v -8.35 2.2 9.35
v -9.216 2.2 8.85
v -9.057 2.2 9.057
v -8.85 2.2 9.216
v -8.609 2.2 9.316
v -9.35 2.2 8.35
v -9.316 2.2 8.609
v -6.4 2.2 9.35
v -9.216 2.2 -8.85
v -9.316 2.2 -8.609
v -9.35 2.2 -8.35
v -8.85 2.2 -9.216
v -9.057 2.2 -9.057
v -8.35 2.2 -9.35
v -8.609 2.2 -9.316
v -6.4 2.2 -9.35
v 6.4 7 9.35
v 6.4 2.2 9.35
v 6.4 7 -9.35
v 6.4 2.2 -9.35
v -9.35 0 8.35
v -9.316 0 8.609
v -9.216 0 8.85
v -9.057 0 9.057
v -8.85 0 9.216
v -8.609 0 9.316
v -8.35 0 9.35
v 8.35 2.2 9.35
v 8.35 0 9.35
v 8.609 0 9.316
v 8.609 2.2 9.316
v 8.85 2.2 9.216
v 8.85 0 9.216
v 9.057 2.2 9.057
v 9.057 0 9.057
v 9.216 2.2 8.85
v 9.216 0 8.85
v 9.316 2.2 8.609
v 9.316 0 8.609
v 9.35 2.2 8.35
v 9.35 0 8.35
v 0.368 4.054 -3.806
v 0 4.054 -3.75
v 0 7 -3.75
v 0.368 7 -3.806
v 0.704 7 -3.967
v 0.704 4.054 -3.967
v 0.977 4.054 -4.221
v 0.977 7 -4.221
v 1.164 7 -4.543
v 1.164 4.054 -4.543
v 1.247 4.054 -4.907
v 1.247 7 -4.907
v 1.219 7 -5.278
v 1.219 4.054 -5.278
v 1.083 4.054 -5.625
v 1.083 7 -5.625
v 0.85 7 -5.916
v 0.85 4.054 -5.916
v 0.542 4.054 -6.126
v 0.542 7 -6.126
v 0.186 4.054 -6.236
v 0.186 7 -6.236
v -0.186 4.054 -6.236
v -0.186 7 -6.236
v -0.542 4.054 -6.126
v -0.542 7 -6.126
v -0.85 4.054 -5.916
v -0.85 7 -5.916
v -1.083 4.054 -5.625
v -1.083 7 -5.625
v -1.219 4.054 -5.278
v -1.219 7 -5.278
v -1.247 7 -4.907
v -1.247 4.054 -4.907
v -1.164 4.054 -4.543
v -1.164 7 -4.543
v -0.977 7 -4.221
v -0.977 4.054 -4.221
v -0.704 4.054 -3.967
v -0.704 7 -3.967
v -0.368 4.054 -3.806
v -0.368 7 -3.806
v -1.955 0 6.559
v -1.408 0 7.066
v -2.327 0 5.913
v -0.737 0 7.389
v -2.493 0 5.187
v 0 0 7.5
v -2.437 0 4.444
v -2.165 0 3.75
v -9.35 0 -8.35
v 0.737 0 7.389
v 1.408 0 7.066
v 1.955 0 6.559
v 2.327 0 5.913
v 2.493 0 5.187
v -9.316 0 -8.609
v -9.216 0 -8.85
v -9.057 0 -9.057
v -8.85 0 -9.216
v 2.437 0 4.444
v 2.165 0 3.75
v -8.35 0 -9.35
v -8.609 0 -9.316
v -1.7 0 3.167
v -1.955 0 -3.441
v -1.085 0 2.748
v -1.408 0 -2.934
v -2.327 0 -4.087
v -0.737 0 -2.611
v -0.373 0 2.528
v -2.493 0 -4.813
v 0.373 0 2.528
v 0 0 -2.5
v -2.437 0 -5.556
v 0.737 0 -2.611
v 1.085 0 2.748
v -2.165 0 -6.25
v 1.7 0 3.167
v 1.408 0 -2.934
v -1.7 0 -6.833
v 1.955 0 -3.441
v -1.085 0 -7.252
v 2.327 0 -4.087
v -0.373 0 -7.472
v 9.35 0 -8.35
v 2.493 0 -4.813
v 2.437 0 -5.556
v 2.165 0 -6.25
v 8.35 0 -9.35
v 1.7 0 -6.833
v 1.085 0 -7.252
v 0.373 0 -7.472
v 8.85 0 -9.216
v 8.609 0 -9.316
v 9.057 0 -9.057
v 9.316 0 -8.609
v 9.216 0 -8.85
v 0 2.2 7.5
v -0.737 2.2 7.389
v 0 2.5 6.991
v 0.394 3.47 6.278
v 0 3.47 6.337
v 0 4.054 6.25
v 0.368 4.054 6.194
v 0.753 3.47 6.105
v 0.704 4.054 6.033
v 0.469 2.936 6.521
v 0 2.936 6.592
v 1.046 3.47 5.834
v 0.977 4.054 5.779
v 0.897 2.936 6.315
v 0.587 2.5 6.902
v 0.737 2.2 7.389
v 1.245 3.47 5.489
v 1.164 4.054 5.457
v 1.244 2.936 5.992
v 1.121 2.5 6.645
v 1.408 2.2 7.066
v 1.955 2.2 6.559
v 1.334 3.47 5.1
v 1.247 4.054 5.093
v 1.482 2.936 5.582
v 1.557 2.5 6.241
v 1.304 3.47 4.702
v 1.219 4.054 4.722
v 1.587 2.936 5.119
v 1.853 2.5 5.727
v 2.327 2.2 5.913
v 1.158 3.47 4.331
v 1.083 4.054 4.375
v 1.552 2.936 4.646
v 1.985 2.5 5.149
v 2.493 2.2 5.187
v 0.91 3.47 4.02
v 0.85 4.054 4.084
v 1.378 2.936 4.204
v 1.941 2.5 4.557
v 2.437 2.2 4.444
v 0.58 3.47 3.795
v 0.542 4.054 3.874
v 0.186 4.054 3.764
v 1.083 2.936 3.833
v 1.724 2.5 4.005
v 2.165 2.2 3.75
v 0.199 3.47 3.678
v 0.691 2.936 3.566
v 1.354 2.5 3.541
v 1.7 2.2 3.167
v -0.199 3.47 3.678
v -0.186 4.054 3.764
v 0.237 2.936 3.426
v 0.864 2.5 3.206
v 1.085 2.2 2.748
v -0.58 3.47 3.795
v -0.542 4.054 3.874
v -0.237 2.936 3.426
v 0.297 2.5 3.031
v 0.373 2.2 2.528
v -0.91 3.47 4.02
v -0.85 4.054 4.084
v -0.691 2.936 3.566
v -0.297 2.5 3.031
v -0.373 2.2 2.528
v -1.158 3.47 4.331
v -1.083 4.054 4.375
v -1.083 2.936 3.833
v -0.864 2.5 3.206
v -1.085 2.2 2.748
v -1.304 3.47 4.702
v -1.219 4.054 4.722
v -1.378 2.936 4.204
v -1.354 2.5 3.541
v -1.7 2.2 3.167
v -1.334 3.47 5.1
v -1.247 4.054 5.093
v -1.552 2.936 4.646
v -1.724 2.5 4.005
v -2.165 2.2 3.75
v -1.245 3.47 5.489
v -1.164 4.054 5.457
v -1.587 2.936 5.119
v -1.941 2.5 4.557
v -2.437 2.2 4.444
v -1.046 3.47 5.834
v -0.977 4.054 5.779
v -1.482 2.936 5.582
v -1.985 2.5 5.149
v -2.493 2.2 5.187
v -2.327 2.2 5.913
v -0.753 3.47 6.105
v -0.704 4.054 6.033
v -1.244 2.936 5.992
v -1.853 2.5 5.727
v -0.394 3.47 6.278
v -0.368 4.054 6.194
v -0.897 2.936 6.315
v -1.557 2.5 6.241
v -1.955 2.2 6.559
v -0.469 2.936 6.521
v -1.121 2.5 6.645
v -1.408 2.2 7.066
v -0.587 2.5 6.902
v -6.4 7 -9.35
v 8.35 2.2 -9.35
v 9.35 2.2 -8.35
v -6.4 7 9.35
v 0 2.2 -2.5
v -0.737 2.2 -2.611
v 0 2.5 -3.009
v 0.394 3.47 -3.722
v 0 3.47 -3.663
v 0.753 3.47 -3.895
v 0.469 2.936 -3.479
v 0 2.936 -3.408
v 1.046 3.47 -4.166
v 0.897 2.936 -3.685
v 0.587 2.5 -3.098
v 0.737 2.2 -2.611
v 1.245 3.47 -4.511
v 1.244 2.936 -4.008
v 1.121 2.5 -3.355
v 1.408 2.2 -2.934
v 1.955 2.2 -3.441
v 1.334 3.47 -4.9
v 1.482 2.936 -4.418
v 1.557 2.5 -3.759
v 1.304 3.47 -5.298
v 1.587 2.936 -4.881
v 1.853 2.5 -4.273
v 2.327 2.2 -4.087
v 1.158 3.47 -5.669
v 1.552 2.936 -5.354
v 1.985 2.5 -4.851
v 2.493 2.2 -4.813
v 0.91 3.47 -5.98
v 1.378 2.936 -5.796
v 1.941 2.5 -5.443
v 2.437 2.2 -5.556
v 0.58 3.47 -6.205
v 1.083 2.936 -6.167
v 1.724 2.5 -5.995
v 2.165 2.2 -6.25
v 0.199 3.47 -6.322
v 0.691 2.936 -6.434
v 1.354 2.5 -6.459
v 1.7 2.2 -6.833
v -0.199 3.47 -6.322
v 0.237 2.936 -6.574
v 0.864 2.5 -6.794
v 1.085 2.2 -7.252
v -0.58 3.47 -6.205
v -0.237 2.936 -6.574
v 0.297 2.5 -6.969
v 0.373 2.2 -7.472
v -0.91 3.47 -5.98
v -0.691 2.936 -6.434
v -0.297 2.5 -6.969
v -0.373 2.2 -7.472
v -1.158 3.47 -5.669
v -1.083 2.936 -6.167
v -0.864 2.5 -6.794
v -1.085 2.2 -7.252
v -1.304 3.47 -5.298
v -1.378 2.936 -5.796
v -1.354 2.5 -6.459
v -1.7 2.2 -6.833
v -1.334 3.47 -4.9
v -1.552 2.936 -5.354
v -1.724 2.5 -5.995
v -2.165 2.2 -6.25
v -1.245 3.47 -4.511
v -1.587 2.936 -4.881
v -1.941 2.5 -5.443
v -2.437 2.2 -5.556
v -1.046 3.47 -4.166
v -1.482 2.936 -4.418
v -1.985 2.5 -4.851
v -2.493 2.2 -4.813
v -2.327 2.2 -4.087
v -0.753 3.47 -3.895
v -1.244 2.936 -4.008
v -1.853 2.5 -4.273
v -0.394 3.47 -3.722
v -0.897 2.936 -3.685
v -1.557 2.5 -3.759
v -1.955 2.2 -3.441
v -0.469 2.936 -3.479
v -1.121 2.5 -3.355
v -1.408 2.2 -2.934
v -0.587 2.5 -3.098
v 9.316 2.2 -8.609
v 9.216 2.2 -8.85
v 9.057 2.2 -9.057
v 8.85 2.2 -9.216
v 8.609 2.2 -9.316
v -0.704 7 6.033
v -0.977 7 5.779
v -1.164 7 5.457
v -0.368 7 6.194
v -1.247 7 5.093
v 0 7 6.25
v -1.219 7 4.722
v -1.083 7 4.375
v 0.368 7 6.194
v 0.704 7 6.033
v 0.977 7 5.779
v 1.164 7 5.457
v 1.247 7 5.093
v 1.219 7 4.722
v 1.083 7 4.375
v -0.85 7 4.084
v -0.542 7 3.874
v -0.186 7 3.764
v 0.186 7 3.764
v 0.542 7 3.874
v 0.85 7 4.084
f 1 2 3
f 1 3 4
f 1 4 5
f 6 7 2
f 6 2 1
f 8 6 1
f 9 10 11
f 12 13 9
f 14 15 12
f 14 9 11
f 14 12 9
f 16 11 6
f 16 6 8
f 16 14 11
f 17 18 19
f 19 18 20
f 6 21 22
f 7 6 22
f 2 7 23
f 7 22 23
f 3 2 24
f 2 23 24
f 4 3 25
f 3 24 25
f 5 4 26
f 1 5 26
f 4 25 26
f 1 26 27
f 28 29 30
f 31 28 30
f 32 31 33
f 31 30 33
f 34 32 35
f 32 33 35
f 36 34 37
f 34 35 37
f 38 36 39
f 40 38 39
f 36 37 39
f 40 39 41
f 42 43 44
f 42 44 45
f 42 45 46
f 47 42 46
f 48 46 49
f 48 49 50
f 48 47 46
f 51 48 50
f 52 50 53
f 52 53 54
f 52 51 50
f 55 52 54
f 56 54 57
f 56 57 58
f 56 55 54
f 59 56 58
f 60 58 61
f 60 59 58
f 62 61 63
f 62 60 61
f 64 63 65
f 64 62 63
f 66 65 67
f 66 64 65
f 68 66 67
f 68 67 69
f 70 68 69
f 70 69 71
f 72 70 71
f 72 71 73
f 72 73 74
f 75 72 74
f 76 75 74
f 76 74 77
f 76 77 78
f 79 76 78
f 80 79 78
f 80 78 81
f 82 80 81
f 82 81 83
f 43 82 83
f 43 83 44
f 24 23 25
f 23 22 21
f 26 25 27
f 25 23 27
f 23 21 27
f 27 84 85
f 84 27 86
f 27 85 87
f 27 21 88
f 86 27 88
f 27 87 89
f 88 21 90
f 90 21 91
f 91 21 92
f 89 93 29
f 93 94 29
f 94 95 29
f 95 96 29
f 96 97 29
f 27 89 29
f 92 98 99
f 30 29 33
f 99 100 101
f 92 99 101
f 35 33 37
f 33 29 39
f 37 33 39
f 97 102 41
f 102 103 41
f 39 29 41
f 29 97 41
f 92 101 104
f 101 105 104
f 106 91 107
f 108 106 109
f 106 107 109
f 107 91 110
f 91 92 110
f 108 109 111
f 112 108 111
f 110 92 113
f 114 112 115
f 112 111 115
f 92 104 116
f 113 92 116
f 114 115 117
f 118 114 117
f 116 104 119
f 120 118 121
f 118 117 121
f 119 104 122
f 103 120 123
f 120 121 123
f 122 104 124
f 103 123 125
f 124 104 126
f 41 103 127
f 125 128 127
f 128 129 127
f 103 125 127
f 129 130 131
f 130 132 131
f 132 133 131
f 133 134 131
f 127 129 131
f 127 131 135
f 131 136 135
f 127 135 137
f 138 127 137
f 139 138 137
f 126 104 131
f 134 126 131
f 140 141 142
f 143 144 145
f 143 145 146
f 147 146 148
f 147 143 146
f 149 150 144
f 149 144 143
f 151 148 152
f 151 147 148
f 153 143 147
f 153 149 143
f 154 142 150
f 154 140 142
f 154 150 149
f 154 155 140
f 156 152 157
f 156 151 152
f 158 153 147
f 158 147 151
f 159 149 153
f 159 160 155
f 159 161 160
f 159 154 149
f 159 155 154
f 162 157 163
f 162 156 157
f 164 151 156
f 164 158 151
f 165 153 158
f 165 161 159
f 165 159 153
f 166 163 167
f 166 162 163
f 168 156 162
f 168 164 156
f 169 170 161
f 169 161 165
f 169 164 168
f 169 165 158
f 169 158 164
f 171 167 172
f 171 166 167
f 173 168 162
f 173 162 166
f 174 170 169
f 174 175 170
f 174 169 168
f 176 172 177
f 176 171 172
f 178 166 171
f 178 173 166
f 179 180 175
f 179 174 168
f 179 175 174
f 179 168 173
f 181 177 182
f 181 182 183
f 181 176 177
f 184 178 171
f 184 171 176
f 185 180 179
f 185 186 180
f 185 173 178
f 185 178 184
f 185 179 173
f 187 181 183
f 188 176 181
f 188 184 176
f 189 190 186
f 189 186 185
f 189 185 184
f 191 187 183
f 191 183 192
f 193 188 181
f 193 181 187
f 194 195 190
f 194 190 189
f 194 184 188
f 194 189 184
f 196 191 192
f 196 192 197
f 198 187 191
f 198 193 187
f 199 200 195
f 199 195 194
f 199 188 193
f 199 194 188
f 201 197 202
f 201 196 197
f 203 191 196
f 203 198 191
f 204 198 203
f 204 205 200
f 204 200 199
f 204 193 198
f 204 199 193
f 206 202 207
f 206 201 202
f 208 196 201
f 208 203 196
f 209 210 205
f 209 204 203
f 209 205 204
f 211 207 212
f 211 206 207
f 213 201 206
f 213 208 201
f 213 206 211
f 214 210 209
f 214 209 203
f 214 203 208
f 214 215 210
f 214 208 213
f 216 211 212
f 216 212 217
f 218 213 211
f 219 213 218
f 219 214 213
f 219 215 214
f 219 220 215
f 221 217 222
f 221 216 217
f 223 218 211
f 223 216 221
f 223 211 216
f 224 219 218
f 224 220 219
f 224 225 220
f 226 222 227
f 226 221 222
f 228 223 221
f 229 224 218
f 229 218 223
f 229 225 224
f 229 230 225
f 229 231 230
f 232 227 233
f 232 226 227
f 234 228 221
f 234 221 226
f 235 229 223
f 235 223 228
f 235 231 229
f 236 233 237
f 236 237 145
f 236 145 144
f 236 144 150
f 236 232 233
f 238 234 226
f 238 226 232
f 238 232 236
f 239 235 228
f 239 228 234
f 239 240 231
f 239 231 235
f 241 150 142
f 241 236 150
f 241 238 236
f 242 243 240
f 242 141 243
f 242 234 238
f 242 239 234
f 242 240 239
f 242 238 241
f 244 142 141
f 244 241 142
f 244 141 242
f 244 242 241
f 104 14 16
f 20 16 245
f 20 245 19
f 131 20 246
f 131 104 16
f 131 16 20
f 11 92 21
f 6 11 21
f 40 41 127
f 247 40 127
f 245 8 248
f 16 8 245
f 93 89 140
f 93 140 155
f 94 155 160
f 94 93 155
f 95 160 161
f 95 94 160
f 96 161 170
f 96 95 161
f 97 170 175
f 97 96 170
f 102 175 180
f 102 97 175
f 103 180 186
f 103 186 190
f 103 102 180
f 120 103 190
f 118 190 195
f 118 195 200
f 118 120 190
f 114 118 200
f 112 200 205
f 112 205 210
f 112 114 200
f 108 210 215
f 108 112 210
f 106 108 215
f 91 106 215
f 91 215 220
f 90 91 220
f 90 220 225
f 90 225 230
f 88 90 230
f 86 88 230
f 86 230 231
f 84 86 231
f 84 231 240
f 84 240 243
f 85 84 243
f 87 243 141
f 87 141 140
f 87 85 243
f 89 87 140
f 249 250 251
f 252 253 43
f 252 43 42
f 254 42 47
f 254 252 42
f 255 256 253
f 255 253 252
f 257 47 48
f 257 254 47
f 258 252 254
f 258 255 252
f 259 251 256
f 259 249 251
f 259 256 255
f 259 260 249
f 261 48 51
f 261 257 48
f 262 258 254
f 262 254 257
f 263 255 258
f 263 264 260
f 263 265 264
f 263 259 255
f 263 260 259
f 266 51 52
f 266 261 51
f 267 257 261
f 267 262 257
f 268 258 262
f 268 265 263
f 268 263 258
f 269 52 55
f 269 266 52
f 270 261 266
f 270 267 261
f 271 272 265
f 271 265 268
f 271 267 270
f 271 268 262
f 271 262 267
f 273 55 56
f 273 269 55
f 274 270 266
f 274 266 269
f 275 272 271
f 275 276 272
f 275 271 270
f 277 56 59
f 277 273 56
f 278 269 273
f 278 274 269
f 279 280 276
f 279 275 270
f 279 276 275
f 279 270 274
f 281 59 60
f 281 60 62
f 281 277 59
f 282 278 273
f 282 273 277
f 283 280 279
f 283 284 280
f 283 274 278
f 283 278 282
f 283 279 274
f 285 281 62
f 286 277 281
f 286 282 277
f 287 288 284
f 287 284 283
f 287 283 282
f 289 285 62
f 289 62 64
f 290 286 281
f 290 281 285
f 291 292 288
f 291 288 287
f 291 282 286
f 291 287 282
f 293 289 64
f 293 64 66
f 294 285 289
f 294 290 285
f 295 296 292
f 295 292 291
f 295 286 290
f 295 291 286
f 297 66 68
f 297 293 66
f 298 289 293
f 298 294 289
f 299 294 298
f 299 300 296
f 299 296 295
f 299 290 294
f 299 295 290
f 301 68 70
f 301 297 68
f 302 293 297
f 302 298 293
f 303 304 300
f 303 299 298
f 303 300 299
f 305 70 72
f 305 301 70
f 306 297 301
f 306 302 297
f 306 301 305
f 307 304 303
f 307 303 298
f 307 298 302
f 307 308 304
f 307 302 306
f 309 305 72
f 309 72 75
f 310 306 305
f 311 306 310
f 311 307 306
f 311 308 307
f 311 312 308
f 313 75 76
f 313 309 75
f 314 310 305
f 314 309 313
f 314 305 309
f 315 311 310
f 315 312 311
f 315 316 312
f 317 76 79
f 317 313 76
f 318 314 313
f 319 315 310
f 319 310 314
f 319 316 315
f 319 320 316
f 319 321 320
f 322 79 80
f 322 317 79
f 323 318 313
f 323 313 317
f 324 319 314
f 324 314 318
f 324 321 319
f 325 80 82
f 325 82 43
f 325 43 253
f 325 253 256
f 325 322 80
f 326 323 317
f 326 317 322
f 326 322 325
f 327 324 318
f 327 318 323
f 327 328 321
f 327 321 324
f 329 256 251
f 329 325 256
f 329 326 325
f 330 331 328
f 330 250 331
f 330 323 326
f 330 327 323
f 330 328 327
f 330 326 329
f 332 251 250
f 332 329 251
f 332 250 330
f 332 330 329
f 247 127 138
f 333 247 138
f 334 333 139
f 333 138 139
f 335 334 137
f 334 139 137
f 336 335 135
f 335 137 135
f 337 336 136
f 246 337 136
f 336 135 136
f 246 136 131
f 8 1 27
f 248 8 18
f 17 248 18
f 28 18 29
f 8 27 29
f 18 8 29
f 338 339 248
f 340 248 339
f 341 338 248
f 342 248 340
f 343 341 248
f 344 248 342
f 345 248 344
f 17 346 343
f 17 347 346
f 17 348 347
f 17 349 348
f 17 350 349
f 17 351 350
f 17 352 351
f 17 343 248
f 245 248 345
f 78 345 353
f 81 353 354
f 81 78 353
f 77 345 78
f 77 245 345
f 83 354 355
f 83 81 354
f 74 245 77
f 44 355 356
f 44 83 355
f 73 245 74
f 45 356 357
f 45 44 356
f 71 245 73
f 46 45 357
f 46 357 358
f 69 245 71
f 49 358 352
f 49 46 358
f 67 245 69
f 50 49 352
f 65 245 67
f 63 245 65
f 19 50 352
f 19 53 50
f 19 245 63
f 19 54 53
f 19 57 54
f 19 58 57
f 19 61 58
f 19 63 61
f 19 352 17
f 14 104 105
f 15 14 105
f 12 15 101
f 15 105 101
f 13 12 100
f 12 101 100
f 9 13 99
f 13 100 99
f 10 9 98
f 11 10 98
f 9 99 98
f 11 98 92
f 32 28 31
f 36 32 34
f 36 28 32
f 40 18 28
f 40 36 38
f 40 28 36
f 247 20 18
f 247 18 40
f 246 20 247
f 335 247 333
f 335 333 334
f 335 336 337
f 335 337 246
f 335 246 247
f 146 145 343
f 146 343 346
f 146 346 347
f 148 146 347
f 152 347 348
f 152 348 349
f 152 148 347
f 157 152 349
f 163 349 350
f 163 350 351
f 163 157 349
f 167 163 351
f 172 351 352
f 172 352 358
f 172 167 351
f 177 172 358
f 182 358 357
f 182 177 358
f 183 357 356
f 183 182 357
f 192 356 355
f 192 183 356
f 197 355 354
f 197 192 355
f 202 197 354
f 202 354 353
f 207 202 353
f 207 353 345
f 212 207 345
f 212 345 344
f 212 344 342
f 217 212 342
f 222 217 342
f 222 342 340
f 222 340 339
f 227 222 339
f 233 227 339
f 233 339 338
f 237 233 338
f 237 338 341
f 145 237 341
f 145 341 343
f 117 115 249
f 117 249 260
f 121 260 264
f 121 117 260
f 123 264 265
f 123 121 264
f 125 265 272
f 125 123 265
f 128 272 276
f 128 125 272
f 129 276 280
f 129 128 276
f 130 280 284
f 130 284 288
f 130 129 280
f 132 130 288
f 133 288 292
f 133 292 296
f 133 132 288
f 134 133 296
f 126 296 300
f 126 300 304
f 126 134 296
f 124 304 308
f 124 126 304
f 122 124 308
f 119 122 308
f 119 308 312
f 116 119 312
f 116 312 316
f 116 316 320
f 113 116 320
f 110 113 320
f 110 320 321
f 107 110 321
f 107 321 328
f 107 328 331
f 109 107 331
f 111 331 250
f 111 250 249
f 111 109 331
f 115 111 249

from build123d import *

# Parameters (mm, degrees)
EXTRUDE_1_DEPTH     = 2.2
EXTRUDE_1_2_DEPTH   = 2.2
SKETCH_1_3_W        = 12.8
SKETCH_1_3_H        = 18.7
SKETCH_1_3_R        = 1.25
EXTRUDE_2_DEPTH     = 7
SKETCH_1_4_R        = 2.5
SKETCH_1_4_R_2      = 1.25
CUT_EXTRUDE_1_DEPTH = 2.2
FILLET_1_R          = 2


with BuildPart() as part:
    # 草图1 → 凸台-拉伸1 (new body)
    with BuildSketch(Plane(origin=(0, 0, 0), x_dir=(1, 0, 0), z_dir=(0, 1, 0))):
        with BuildLine():
            Line((-6.4, 9.35), (-8.35, 9.35))
            ThreePointArc((-8.35, 9.35), (-9.057106781, 9.057106781), (-9.35, 8.35))
            Line((-9.35, 8.35), (-9.35, -8.35))
            ThreePointArc((-9.35, -8.35), (-9.057106781, -9.057106781), (-8.35, -9.35))
            Line((-8.35, -9.35), (-6.4, -9.35))
            Line((-6.4, -9.35), (-6.4, 9.35))
        make_face()
    extrude(amount=EXTRUDE_1_DEPTH)



with BuildPart() as body_2:
    # 草图1 → Extrude 1 2 (new body)
    with BuildSketch(Plane(origin=(0, 0, 0), x_dir=(1, 0, 0), z_dir=(0, 1, 0))):
        with BuildLine():
            Line((8.35, 9.35), (6.4, 9.35))
            Line((6.4, 9.35), (6.4, -9.35))
            Line((6.4, -9.35), (8.35, -9.35))
            ThreePointArc((8.35, -9.35), (9.057106781, -9.057106781), (9.35, -8.35))
            Line((9.35, -8.35), (9.35, 8.35))
            ThreePointArc((9.35, 8.35), (9.057106781, 9.057106781), (8.35, 9.35))
        make_face()
    extrude(amount=EXTRUDE_1_2_DEPTH)


with BuildPart() as part_1:
    add(part.part)

    add(body_2.part)  # 凸台-拉伸2 merges body 2
    # 草图1<3> → 凸台-拉伸2 (add)
    with BuildSketch(Plane(origin=(0, 0, 0), x_dir=(1, 0, 0), z_dir=(0, 1, 0))):
        Rectangle(SKETCH_1_3_W, SKETCH_1_3_H)
        with Locations(Location((0, 5, 0), (0, 0, 270))):
            Circle(SKETCH_1_3_R, mode=Mode.SUBTRACT)
        with Locations(Location((0, -5, 0), (0, 0, 270))):
            Circle(SKETCH_1_3_R, mode=Mode.SUBTRACT)
    extrude(amount=EXTRUDE_2_DEPTH)

    # 草图1<4> → 切除-拉伸1 (cut)
    # profile 1 of 2: a face of its own
    with BuildSketch(Plane(origin=(0, 0, 0), x_dir=(1, 0, 0), z_dir=(0, 1, 0))):
        with Locations(Location((0, -5, 0), (0, 0, 270))):
            Circle(SKETCH_1_4_R)
        with Locations(Location((0, -5, 0), (0, 0, 270))):
            Circle(SKETCH_1_4_R_2, mode=Mode.SUBTRACT)
    # profile 2 of 2: a face of its own
    with BuildSketch(Plane(origin=(0, 0, 0), x_dir=(1, 0, 0), z_dir=(0, 1, 0))):
        with Locations(Location((0, 5, 0), (0, 0, 270))):
            Circle(SKETCH_1_4_R)
        with Locations(Location((0, 5, 0), (0, 0, 270))):
            Circle(SKETCH_1_4_R_2, mode=Mode.SUBTRACT)
    extrude(amount=CUT_EXTRUDE_1_DEPTH, mode=Mode.SUBTRACT)

    # 圆角1
    # the kernel refuses this fillet: 2 mm, written as the material it takes off along each edge
    with BuildSketch(Plane(origin=(0, 2.2, 5), x_dir=(0, 0, 1), z_dir=(-1, 0, 0))) as fillet_1_piece_1:
        with BuildLine():
            CenterArc((3.25, 1.854049622), FILLET_1_R, 180, 67.975687163)
            Line((2.5, 0), (2.485, -0.037080992))
            ThreePointArc((2.485, -0.037080992), (1.875, -0.04), (1.25, -0.04))
            Line((1.25, -0.04), (1.21, 0))
            Line((1.21, 0), (1.21, 1.854049622))
            Line((1.21, 1.854049622), (1.25, 1.854049622))
        make_face()
    revolve(axis=Axis((0, 2.2, 5), (0, 1, 0)), mode=Mode.SUBTRACT)
    with BuildSketch(Plane(origin=(0, 2.2, -5), x_dir=(0, 0, 1), z_dir=(-1, 0, 0))) as fillet_1_piece_2:
        with BuildLine():
            CenterArc((3.25, 1.854049622), FILLET_1_R, 180, 67.975687163)
            Line((2.5, 0), (2.485, -0.037080992))
            ThreePointArc((2.485, -0.037080992), (1.875, -0.04), (1.25, -0.04))
            Line((1.25, -0.04), (1.21, 0))
            Line((1.21, 0), (1.21, 1.854049622))
            Line((1.21, 1.854049622), (1.25, 1.854049622))
        make_face()
    revolve(axis=Axis((0, 2.2, -5), (0, 1, 0)), mode=Mode.SUBTRACT)


solid = part_1.part
